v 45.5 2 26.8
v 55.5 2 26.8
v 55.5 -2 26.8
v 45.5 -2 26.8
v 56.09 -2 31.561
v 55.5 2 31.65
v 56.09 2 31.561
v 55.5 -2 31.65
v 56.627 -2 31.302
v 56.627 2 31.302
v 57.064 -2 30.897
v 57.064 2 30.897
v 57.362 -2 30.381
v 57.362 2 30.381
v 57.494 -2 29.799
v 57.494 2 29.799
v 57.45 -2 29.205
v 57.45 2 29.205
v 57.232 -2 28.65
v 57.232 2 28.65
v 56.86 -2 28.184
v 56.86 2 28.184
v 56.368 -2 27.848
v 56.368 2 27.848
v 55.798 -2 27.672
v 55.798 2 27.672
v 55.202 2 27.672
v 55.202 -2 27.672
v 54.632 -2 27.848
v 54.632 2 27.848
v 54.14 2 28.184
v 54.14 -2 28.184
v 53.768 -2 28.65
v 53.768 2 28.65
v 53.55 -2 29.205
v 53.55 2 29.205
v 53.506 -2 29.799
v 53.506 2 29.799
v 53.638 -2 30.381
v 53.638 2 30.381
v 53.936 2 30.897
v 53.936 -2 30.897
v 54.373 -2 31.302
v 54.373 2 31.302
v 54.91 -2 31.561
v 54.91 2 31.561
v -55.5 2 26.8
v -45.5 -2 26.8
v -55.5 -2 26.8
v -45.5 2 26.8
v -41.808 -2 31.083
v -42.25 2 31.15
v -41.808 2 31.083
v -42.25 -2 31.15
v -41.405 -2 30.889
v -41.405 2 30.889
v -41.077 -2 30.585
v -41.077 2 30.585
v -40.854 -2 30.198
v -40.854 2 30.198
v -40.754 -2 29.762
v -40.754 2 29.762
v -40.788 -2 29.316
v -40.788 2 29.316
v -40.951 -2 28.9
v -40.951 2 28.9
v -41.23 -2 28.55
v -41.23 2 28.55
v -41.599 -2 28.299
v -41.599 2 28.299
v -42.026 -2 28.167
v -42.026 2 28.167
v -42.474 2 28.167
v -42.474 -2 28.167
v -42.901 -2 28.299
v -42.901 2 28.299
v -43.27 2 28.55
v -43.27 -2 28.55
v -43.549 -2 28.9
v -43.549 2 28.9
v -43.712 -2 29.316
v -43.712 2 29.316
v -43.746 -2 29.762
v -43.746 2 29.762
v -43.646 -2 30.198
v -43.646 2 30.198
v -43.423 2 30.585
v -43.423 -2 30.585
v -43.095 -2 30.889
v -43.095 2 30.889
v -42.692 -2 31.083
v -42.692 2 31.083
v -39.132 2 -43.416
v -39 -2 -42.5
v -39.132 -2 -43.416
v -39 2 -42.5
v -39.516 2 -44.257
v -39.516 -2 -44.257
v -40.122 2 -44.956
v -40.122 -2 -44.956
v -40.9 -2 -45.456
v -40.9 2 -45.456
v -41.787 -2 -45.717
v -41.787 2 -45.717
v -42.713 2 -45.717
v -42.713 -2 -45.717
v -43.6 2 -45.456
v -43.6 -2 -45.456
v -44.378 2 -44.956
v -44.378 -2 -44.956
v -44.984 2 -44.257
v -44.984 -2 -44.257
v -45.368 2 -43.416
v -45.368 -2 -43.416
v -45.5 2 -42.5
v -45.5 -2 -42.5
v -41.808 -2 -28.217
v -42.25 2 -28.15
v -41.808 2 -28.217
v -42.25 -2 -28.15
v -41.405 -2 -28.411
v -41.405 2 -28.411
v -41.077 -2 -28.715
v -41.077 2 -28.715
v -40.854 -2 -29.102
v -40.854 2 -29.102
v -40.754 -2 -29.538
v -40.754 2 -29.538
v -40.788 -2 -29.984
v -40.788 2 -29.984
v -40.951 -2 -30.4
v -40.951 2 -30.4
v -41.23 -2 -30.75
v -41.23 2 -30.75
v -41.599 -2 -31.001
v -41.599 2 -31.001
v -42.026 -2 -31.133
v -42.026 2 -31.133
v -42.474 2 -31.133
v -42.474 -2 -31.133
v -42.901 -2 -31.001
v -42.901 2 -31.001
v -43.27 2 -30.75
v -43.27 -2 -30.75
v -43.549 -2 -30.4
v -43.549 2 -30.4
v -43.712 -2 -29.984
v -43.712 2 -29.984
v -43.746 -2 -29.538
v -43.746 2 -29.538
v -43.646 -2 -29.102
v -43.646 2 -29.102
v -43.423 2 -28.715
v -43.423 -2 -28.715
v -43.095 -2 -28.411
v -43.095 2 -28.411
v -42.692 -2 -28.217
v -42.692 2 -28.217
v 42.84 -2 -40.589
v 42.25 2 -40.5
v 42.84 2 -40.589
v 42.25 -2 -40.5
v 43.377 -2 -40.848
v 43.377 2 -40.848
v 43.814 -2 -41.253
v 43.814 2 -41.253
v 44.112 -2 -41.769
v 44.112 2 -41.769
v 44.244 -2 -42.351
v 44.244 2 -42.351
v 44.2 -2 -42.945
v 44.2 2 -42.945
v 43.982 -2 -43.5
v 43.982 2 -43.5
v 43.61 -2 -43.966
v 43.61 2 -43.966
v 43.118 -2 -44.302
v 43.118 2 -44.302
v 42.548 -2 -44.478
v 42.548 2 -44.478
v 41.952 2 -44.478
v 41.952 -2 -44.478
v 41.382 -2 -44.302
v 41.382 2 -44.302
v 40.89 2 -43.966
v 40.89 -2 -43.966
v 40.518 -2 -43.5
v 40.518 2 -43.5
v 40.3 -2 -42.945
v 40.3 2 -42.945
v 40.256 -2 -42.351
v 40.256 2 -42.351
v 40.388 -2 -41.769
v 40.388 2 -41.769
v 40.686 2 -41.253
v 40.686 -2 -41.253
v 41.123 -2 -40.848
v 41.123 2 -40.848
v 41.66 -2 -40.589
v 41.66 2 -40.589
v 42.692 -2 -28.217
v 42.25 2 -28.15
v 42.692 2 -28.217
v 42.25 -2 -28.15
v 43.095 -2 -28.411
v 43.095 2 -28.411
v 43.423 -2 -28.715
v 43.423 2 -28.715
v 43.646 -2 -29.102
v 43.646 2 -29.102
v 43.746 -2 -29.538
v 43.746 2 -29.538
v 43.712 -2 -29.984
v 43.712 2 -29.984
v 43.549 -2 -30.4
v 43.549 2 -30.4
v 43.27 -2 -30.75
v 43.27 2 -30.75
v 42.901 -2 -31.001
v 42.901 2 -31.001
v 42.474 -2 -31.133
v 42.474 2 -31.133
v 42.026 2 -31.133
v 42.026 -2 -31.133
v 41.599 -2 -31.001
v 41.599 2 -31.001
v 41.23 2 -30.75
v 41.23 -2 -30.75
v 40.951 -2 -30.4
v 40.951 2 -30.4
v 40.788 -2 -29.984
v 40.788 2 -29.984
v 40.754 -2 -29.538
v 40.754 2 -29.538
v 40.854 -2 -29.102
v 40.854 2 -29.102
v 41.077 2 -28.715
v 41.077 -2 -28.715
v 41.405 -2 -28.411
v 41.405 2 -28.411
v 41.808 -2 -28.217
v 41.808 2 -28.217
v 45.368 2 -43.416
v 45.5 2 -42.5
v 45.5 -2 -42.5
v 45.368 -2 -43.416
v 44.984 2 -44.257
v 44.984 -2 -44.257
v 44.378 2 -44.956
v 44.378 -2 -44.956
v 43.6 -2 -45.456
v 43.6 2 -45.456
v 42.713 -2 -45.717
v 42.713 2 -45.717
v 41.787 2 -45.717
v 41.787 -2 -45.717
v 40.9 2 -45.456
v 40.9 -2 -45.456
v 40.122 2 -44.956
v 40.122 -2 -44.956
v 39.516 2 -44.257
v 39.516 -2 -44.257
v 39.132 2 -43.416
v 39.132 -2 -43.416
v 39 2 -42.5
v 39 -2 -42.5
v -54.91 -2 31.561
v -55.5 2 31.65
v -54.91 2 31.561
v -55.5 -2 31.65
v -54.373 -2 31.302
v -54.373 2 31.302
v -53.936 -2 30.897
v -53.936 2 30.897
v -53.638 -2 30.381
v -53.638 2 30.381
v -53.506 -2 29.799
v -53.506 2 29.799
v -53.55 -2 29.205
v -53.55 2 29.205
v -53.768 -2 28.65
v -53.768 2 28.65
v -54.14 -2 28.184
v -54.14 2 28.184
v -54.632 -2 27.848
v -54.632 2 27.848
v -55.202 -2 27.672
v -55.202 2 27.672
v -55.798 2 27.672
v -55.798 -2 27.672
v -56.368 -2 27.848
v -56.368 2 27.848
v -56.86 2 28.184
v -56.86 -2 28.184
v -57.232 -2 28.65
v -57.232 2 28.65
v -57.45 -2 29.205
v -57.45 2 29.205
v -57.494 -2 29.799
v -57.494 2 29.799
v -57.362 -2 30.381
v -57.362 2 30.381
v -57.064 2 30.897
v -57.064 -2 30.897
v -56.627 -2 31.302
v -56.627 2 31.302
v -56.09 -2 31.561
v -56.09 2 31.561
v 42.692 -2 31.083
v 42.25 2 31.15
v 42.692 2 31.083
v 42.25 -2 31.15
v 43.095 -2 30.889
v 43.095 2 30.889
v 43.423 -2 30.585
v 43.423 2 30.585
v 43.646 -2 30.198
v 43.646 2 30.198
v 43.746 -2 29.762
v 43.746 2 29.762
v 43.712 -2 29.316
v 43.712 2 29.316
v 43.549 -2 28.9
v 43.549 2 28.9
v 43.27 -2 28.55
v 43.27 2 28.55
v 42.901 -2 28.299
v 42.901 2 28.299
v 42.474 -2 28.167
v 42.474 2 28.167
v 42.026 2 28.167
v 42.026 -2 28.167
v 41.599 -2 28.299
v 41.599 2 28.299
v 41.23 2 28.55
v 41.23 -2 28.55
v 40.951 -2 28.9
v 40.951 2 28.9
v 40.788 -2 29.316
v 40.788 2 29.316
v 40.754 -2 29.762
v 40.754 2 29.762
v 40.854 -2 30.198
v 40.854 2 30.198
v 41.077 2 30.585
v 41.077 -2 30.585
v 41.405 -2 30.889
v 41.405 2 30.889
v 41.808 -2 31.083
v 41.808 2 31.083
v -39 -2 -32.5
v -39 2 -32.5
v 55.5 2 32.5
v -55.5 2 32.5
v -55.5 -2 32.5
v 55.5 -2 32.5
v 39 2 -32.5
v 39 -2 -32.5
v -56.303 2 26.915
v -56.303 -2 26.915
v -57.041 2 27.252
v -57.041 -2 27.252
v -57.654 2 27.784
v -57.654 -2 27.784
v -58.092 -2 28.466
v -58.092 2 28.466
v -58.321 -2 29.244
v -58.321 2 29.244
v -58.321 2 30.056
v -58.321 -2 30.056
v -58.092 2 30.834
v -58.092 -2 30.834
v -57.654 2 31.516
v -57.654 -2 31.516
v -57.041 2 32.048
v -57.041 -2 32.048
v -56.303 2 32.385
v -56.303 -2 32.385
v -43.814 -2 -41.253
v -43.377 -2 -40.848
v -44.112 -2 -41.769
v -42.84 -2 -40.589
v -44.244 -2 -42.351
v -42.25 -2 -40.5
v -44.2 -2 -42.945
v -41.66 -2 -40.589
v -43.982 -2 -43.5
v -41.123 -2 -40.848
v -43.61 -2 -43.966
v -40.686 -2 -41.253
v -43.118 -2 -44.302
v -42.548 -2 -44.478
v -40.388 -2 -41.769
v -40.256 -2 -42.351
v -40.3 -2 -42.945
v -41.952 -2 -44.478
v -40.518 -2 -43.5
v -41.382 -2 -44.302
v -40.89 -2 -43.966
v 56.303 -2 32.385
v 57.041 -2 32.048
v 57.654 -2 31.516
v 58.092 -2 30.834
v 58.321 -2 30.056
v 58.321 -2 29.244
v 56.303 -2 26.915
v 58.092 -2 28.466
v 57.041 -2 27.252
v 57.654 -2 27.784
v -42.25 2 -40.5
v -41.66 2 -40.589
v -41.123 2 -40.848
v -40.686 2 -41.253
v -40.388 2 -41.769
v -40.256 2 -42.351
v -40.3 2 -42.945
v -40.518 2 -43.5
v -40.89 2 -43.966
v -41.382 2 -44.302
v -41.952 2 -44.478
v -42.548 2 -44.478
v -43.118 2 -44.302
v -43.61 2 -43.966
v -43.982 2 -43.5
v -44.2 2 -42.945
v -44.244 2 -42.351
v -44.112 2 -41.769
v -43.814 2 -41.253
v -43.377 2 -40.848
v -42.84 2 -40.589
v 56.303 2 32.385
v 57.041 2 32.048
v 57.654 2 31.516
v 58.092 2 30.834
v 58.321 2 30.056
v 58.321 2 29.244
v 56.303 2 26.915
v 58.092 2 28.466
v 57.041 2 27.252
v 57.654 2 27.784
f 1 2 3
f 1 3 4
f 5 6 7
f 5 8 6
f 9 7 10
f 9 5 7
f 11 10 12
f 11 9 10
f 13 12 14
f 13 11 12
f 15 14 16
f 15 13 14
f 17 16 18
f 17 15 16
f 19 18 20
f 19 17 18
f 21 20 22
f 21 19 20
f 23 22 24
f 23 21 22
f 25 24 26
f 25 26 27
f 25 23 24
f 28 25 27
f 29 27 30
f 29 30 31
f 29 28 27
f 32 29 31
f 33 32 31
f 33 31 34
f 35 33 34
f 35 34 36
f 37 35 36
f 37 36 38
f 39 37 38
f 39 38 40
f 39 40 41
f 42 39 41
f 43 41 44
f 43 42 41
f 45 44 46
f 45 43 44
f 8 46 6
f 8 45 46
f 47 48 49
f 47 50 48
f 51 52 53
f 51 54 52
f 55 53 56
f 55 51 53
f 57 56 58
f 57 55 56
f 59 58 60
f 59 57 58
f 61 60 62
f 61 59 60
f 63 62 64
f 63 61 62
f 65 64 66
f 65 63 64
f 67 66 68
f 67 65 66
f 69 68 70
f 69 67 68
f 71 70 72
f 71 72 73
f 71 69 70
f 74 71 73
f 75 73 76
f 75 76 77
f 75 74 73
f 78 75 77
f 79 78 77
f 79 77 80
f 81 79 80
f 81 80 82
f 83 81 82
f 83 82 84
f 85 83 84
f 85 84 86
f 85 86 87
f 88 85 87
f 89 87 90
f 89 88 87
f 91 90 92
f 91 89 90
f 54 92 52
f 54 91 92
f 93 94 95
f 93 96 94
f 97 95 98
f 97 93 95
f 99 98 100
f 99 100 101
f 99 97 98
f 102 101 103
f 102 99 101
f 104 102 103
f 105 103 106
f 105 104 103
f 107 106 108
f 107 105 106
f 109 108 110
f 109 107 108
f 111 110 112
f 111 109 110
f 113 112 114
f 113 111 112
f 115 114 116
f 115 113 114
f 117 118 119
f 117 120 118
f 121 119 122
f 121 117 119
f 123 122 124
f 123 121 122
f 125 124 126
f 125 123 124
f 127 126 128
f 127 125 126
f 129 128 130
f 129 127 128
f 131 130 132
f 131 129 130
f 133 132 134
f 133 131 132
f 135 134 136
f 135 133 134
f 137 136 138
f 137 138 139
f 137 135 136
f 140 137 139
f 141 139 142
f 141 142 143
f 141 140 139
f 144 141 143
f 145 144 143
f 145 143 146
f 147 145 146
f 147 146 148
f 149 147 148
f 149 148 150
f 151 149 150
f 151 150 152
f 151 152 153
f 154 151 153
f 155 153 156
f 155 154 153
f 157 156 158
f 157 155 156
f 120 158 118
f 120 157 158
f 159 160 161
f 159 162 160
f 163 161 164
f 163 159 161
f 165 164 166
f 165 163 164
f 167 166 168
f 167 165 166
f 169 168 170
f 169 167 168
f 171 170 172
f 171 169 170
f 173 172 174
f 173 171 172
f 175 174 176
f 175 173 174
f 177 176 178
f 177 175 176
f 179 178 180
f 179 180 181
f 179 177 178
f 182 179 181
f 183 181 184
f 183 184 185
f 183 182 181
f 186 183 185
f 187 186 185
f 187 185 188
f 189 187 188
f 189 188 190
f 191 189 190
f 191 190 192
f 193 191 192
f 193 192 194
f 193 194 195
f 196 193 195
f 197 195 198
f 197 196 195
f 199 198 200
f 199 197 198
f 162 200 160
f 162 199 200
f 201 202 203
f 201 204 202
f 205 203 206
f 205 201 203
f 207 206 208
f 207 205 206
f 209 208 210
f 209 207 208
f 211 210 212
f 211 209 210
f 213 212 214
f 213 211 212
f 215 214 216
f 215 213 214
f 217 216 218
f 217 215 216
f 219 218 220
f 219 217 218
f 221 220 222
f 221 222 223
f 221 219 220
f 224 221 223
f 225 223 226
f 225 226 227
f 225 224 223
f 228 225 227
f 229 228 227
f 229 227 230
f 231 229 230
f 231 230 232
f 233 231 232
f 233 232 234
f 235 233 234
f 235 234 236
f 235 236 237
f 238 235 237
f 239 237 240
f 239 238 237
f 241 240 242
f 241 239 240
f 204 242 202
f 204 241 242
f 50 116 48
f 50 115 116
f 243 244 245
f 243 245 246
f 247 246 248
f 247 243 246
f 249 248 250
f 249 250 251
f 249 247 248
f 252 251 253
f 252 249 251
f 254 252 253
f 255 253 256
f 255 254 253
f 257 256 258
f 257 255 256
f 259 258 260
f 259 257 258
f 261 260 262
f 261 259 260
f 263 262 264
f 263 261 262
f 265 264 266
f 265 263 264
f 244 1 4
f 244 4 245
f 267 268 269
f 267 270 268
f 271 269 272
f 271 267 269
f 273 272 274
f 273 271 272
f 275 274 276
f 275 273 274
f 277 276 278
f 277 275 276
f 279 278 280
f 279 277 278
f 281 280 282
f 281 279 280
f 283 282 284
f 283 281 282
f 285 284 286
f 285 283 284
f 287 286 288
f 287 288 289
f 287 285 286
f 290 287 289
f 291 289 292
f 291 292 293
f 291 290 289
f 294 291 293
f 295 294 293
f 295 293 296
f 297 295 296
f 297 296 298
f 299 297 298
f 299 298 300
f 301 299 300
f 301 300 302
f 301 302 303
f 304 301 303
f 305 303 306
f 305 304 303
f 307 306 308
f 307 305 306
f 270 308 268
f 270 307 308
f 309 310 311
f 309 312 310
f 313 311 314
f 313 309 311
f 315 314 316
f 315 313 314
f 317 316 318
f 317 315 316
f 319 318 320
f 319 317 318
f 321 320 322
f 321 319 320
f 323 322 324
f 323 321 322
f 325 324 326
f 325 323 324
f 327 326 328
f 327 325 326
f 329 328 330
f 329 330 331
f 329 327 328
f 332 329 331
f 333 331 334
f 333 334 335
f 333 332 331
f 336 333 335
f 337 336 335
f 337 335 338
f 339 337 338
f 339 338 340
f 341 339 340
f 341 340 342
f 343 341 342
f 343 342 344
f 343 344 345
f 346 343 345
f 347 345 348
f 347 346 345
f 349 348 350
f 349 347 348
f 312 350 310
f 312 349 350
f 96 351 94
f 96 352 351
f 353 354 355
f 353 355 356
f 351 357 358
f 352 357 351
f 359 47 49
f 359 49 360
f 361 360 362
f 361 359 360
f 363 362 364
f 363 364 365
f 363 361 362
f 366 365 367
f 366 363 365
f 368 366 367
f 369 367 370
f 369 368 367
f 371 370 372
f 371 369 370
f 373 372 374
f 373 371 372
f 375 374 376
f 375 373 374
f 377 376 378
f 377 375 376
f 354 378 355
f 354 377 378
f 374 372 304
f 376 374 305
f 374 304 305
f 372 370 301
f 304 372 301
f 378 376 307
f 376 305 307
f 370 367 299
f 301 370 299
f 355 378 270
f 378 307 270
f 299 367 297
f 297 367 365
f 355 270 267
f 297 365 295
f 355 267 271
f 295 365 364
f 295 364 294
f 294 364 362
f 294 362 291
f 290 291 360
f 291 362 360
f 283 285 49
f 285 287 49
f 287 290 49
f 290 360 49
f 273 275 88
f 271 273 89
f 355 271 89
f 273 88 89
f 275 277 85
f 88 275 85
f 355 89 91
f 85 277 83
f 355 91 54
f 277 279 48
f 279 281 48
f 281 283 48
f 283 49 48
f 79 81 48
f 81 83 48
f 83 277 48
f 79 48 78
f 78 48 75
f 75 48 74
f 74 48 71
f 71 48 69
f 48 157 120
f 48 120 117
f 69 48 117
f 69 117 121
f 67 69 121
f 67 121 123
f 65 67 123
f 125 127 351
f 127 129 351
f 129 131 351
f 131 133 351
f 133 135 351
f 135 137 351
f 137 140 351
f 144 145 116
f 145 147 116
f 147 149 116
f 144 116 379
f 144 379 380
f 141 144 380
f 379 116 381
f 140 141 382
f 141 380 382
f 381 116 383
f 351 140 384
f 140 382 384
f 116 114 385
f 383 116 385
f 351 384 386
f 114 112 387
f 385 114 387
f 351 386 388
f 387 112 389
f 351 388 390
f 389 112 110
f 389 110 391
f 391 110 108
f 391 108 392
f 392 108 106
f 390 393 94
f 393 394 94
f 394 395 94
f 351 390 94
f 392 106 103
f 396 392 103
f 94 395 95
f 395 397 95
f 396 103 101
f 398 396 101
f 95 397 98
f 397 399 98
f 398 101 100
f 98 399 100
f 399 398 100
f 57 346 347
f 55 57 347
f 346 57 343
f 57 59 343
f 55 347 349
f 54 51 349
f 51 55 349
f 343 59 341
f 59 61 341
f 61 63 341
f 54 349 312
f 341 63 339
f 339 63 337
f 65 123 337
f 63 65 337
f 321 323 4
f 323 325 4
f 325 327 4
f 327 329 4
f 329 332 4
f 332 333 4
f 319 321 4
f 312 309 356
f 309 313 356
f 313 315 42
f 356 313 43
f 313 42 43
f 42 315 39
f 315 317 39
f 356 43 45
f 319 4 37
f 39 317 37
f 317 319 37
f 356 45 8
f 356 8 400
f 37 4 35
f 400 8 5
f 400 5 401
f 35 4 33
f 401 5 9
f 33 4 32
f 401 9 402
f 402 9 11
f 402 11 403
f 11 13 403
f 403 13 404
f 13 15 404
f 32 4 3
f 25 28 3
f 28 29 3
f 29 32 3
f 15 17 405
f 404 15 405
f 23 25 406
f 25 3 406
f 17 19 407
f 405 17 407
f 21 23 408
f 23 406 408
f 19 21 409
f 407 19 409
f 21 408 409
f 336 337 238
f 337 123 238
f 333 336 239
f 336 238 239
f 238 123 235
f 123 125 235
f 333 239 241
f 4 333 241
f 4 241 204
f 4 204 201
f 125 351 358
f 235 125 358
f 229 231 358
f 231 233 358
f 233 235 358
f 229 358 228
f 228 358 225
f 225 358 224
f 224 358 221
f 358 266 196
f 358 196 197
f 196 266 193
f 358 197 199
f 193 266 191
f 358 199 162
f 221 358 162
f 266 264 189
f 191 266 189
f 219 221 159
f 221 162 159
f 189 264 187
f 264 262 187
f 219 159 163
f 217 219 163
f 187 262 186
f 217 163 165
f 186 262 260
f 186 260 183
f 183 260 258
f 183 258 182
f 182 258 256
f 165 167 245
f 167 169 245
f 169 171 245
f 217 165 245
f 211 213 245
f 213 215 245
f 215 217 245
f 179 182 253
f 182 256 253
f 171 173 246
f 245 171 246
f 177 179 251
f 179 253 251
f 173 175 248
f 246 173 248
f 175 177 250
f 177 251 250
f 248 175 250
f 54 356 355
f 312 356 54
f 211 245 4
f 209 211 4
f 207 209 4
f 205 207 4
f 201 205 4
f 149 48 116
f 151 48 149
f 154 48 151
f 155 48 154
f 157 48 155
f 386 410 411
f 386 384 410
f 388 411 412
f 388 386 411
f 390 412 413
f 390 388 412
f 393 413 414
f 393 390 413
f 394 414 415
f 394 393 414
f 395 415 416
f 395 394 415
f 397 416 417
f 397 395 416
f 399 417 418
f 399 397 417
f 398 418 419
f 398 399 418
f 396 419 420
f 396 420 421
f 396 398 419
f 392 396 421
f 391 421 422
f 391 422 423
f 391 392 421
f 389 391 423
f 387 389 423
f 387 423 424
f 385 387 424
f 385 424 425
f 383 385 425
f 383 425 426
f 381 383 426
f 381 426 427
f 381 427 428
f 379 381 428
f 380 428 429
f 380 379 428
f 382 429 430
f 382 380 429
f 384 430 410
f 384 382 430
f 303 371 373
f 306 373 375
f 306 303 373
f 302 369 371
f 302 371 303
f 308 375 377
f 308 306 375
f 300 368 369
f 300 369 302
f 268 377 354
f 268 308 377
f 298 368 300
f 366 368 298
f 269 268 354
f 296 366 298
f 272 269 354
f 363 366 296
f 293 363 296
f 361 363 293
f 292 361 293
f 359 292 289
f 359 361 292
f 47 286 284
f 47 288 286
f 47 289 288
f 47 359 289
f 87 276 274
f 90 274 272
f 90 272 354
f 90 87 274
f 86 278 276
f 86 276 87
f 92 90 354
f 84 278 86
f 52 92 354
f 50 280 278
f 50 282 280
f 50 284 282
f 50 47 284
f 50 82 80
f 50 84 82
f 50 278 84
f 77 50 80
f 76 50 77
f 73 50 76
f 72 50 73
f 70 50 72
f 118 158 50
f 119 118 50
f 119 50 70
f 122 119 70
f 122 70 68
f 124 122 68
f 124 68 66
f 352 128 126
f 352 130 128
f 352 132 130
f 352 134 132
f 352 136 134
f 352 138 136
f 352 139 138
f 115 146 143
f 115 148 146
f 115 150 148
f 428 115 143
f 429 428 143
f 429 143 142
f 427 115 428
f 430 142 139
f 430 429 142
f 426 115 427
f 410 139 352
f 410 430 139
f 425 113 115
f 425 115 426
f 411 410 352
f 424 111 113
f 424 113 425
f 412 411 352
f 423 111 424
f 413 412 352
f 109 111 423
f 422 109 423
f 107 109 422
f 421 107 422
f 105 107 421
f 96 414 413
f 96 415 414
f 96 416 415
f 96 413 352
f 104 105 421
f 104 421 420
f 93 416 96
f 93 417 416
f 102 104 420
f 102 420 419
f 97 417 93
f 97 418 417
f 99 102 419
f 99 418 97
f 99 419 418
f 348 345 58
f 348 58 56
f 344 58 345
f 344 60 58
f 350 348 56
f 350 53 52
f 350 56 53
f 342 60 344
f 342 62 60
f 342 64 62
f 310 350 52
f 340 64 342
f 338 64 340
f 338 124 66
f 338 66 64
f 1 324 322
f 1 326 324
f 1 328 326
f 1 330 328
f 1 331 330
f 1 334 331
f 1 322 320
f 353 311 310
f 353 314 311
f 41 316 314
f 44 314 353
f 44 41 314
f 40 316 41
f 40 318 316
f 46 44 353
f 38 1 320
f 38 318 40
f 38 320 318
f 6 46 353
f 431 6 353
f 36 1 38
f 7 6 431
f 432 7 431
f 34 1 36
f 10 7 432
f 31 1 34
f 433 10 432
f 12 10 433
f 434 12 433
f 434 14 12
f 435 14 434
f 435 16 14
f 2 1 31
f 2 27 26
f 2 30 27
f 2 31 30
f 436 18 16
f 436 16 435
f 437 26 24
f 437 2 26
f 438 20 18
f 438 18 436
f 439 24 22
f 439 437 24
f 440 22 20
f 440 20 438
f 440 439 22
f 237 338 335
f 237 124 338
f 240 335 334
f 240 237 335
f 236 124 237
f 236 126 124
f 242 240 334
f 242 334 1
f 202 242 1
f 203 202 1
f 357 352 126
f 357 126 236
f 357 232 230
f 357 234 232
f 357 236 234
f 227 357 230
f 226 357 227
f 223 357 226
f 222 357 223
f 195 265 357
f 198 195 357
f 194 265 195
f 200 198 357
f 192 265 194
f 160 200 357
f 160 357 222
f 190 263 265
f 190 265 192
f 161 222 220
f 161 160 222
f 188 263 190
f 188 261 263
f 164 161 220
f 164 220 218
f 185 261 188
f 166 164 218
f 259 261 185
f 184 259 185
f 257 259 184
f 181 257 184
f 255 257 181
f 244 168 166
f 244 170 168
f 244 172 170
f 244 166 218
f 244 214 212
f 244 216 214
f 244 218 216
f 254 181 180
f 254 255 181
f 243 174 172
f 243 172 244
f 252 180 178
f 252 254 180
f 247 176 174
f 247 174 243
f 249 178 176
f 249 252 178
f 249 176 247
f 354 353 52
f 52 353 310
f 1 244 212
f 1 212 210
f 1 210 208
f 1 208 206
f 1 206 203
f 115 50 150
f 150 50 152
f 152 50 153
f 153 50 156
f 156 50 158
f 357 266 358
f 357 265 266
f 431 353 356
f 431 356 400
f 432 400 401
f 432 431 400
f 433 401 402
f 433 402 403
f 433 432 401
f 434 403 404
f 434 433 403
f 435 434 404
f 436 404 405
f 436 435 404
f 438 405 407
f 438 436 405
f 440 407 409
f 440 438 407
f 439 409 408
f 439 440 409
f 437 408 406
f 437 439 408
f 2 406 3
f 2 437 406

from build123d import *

# Parameters (mm, degrees)
SKETCH1_R           = 1.5
SKETCH1_R_2         = 2
BOSS_EXTRUDE1_DEPTH = 2


with BuildPart() as part:
    # Sketch1 → Boss-Extrude1 (new, symmetric)
    with BuildSketch(Plane(origin=(0, 0, 0), x_dir=(1, 0, 0), z_dir=(0, 1, 0))):
        with BuildLine():
            Line((-45.5, 32.5), (-45.5, -26.8))
            Line((-45.5, -26.8), (-55.5, -26.8))
            ThreePointArc((-55.5, -26.8), (-58.35, -29.65), (-55.5, -32.5))
            Line((-55.5, -32.5), (-45.5, -32.5))
            Line((-45.5, -32.5), (45.5, -32.5))
            Line((45.5, -32.5), (55.5, -32.5))
            ThreePointArc((55.5, -32.5), (58.35, -29.65), (55.5, -26.8))
            Line((55.5, -26.8), (45.5, -26.8))
            Line((45.5, -26.8), (45.5, 32.5))
            Line((45.5, 32.5), (45.5, 42.5))
            ThreePointArc((45.5, 42.5), (42.25, 45.75), (39, 42.5))
            Line((39, 42.5), (39, 32.5))
            Line((39, 32.5), (-39, 32.5))
            Line((-39, 32.5), (-39, 42.5))
            ThreePointArc((-39, 42.5), (-42.25, 45.75), (-45.5, 42.5))
            Line((-45.5, 42.5), (-45.5, 32.5))
        make_face()
        with Locations(Location((-42.25, 29.65, 0), (0, 0, 270))):
            Circle(SKETCH1_R, mode=Mode.SUBTRACT)
        with Locations(Location((42.25, 29.65, 0), (0, 0, 270))):
            Circle(SKETCH1_R, mode=Mode.SUBTRACT)
        with Locations(Location((42.25, -29.65, 0), (0, 0, 270))):
            Circle(SKETCH1_R, mode=Mode.SUBTRACT)
        with Locations(Location((-42.25, -29.65, 0), (0, 0, 270))):
            Circle(SKETCH1_R, mode=Mode.SUBTRACT)
        with Locations(Location((-42.25, 42.5, 0), (0, 0, 270))):
            Circle(SKETCH1_R_2, mode=Mode.SUBTRACT)
        with Locations(Location((42.25, 42.5, 0), (0, 0, 270))):
            Circle(SKETCH1_R_2, mode=Mode.SUBTRACT)
        with Locations(Location((-55.5, -29.65, 0), (0, 0, 270))):
            Circle(SKETCH1_R_2, mode=Mode.SUBTRACT)
        with Locations(Location((55.5, -29.65, 0), (0, 0, 270))):
            Circle(SKETCH1_R_2, mode=Mode.SUBTRACT)
    extrude(amount=BOSS_EXTRUDE1_DEPTH, both=True)


solid = part.part
